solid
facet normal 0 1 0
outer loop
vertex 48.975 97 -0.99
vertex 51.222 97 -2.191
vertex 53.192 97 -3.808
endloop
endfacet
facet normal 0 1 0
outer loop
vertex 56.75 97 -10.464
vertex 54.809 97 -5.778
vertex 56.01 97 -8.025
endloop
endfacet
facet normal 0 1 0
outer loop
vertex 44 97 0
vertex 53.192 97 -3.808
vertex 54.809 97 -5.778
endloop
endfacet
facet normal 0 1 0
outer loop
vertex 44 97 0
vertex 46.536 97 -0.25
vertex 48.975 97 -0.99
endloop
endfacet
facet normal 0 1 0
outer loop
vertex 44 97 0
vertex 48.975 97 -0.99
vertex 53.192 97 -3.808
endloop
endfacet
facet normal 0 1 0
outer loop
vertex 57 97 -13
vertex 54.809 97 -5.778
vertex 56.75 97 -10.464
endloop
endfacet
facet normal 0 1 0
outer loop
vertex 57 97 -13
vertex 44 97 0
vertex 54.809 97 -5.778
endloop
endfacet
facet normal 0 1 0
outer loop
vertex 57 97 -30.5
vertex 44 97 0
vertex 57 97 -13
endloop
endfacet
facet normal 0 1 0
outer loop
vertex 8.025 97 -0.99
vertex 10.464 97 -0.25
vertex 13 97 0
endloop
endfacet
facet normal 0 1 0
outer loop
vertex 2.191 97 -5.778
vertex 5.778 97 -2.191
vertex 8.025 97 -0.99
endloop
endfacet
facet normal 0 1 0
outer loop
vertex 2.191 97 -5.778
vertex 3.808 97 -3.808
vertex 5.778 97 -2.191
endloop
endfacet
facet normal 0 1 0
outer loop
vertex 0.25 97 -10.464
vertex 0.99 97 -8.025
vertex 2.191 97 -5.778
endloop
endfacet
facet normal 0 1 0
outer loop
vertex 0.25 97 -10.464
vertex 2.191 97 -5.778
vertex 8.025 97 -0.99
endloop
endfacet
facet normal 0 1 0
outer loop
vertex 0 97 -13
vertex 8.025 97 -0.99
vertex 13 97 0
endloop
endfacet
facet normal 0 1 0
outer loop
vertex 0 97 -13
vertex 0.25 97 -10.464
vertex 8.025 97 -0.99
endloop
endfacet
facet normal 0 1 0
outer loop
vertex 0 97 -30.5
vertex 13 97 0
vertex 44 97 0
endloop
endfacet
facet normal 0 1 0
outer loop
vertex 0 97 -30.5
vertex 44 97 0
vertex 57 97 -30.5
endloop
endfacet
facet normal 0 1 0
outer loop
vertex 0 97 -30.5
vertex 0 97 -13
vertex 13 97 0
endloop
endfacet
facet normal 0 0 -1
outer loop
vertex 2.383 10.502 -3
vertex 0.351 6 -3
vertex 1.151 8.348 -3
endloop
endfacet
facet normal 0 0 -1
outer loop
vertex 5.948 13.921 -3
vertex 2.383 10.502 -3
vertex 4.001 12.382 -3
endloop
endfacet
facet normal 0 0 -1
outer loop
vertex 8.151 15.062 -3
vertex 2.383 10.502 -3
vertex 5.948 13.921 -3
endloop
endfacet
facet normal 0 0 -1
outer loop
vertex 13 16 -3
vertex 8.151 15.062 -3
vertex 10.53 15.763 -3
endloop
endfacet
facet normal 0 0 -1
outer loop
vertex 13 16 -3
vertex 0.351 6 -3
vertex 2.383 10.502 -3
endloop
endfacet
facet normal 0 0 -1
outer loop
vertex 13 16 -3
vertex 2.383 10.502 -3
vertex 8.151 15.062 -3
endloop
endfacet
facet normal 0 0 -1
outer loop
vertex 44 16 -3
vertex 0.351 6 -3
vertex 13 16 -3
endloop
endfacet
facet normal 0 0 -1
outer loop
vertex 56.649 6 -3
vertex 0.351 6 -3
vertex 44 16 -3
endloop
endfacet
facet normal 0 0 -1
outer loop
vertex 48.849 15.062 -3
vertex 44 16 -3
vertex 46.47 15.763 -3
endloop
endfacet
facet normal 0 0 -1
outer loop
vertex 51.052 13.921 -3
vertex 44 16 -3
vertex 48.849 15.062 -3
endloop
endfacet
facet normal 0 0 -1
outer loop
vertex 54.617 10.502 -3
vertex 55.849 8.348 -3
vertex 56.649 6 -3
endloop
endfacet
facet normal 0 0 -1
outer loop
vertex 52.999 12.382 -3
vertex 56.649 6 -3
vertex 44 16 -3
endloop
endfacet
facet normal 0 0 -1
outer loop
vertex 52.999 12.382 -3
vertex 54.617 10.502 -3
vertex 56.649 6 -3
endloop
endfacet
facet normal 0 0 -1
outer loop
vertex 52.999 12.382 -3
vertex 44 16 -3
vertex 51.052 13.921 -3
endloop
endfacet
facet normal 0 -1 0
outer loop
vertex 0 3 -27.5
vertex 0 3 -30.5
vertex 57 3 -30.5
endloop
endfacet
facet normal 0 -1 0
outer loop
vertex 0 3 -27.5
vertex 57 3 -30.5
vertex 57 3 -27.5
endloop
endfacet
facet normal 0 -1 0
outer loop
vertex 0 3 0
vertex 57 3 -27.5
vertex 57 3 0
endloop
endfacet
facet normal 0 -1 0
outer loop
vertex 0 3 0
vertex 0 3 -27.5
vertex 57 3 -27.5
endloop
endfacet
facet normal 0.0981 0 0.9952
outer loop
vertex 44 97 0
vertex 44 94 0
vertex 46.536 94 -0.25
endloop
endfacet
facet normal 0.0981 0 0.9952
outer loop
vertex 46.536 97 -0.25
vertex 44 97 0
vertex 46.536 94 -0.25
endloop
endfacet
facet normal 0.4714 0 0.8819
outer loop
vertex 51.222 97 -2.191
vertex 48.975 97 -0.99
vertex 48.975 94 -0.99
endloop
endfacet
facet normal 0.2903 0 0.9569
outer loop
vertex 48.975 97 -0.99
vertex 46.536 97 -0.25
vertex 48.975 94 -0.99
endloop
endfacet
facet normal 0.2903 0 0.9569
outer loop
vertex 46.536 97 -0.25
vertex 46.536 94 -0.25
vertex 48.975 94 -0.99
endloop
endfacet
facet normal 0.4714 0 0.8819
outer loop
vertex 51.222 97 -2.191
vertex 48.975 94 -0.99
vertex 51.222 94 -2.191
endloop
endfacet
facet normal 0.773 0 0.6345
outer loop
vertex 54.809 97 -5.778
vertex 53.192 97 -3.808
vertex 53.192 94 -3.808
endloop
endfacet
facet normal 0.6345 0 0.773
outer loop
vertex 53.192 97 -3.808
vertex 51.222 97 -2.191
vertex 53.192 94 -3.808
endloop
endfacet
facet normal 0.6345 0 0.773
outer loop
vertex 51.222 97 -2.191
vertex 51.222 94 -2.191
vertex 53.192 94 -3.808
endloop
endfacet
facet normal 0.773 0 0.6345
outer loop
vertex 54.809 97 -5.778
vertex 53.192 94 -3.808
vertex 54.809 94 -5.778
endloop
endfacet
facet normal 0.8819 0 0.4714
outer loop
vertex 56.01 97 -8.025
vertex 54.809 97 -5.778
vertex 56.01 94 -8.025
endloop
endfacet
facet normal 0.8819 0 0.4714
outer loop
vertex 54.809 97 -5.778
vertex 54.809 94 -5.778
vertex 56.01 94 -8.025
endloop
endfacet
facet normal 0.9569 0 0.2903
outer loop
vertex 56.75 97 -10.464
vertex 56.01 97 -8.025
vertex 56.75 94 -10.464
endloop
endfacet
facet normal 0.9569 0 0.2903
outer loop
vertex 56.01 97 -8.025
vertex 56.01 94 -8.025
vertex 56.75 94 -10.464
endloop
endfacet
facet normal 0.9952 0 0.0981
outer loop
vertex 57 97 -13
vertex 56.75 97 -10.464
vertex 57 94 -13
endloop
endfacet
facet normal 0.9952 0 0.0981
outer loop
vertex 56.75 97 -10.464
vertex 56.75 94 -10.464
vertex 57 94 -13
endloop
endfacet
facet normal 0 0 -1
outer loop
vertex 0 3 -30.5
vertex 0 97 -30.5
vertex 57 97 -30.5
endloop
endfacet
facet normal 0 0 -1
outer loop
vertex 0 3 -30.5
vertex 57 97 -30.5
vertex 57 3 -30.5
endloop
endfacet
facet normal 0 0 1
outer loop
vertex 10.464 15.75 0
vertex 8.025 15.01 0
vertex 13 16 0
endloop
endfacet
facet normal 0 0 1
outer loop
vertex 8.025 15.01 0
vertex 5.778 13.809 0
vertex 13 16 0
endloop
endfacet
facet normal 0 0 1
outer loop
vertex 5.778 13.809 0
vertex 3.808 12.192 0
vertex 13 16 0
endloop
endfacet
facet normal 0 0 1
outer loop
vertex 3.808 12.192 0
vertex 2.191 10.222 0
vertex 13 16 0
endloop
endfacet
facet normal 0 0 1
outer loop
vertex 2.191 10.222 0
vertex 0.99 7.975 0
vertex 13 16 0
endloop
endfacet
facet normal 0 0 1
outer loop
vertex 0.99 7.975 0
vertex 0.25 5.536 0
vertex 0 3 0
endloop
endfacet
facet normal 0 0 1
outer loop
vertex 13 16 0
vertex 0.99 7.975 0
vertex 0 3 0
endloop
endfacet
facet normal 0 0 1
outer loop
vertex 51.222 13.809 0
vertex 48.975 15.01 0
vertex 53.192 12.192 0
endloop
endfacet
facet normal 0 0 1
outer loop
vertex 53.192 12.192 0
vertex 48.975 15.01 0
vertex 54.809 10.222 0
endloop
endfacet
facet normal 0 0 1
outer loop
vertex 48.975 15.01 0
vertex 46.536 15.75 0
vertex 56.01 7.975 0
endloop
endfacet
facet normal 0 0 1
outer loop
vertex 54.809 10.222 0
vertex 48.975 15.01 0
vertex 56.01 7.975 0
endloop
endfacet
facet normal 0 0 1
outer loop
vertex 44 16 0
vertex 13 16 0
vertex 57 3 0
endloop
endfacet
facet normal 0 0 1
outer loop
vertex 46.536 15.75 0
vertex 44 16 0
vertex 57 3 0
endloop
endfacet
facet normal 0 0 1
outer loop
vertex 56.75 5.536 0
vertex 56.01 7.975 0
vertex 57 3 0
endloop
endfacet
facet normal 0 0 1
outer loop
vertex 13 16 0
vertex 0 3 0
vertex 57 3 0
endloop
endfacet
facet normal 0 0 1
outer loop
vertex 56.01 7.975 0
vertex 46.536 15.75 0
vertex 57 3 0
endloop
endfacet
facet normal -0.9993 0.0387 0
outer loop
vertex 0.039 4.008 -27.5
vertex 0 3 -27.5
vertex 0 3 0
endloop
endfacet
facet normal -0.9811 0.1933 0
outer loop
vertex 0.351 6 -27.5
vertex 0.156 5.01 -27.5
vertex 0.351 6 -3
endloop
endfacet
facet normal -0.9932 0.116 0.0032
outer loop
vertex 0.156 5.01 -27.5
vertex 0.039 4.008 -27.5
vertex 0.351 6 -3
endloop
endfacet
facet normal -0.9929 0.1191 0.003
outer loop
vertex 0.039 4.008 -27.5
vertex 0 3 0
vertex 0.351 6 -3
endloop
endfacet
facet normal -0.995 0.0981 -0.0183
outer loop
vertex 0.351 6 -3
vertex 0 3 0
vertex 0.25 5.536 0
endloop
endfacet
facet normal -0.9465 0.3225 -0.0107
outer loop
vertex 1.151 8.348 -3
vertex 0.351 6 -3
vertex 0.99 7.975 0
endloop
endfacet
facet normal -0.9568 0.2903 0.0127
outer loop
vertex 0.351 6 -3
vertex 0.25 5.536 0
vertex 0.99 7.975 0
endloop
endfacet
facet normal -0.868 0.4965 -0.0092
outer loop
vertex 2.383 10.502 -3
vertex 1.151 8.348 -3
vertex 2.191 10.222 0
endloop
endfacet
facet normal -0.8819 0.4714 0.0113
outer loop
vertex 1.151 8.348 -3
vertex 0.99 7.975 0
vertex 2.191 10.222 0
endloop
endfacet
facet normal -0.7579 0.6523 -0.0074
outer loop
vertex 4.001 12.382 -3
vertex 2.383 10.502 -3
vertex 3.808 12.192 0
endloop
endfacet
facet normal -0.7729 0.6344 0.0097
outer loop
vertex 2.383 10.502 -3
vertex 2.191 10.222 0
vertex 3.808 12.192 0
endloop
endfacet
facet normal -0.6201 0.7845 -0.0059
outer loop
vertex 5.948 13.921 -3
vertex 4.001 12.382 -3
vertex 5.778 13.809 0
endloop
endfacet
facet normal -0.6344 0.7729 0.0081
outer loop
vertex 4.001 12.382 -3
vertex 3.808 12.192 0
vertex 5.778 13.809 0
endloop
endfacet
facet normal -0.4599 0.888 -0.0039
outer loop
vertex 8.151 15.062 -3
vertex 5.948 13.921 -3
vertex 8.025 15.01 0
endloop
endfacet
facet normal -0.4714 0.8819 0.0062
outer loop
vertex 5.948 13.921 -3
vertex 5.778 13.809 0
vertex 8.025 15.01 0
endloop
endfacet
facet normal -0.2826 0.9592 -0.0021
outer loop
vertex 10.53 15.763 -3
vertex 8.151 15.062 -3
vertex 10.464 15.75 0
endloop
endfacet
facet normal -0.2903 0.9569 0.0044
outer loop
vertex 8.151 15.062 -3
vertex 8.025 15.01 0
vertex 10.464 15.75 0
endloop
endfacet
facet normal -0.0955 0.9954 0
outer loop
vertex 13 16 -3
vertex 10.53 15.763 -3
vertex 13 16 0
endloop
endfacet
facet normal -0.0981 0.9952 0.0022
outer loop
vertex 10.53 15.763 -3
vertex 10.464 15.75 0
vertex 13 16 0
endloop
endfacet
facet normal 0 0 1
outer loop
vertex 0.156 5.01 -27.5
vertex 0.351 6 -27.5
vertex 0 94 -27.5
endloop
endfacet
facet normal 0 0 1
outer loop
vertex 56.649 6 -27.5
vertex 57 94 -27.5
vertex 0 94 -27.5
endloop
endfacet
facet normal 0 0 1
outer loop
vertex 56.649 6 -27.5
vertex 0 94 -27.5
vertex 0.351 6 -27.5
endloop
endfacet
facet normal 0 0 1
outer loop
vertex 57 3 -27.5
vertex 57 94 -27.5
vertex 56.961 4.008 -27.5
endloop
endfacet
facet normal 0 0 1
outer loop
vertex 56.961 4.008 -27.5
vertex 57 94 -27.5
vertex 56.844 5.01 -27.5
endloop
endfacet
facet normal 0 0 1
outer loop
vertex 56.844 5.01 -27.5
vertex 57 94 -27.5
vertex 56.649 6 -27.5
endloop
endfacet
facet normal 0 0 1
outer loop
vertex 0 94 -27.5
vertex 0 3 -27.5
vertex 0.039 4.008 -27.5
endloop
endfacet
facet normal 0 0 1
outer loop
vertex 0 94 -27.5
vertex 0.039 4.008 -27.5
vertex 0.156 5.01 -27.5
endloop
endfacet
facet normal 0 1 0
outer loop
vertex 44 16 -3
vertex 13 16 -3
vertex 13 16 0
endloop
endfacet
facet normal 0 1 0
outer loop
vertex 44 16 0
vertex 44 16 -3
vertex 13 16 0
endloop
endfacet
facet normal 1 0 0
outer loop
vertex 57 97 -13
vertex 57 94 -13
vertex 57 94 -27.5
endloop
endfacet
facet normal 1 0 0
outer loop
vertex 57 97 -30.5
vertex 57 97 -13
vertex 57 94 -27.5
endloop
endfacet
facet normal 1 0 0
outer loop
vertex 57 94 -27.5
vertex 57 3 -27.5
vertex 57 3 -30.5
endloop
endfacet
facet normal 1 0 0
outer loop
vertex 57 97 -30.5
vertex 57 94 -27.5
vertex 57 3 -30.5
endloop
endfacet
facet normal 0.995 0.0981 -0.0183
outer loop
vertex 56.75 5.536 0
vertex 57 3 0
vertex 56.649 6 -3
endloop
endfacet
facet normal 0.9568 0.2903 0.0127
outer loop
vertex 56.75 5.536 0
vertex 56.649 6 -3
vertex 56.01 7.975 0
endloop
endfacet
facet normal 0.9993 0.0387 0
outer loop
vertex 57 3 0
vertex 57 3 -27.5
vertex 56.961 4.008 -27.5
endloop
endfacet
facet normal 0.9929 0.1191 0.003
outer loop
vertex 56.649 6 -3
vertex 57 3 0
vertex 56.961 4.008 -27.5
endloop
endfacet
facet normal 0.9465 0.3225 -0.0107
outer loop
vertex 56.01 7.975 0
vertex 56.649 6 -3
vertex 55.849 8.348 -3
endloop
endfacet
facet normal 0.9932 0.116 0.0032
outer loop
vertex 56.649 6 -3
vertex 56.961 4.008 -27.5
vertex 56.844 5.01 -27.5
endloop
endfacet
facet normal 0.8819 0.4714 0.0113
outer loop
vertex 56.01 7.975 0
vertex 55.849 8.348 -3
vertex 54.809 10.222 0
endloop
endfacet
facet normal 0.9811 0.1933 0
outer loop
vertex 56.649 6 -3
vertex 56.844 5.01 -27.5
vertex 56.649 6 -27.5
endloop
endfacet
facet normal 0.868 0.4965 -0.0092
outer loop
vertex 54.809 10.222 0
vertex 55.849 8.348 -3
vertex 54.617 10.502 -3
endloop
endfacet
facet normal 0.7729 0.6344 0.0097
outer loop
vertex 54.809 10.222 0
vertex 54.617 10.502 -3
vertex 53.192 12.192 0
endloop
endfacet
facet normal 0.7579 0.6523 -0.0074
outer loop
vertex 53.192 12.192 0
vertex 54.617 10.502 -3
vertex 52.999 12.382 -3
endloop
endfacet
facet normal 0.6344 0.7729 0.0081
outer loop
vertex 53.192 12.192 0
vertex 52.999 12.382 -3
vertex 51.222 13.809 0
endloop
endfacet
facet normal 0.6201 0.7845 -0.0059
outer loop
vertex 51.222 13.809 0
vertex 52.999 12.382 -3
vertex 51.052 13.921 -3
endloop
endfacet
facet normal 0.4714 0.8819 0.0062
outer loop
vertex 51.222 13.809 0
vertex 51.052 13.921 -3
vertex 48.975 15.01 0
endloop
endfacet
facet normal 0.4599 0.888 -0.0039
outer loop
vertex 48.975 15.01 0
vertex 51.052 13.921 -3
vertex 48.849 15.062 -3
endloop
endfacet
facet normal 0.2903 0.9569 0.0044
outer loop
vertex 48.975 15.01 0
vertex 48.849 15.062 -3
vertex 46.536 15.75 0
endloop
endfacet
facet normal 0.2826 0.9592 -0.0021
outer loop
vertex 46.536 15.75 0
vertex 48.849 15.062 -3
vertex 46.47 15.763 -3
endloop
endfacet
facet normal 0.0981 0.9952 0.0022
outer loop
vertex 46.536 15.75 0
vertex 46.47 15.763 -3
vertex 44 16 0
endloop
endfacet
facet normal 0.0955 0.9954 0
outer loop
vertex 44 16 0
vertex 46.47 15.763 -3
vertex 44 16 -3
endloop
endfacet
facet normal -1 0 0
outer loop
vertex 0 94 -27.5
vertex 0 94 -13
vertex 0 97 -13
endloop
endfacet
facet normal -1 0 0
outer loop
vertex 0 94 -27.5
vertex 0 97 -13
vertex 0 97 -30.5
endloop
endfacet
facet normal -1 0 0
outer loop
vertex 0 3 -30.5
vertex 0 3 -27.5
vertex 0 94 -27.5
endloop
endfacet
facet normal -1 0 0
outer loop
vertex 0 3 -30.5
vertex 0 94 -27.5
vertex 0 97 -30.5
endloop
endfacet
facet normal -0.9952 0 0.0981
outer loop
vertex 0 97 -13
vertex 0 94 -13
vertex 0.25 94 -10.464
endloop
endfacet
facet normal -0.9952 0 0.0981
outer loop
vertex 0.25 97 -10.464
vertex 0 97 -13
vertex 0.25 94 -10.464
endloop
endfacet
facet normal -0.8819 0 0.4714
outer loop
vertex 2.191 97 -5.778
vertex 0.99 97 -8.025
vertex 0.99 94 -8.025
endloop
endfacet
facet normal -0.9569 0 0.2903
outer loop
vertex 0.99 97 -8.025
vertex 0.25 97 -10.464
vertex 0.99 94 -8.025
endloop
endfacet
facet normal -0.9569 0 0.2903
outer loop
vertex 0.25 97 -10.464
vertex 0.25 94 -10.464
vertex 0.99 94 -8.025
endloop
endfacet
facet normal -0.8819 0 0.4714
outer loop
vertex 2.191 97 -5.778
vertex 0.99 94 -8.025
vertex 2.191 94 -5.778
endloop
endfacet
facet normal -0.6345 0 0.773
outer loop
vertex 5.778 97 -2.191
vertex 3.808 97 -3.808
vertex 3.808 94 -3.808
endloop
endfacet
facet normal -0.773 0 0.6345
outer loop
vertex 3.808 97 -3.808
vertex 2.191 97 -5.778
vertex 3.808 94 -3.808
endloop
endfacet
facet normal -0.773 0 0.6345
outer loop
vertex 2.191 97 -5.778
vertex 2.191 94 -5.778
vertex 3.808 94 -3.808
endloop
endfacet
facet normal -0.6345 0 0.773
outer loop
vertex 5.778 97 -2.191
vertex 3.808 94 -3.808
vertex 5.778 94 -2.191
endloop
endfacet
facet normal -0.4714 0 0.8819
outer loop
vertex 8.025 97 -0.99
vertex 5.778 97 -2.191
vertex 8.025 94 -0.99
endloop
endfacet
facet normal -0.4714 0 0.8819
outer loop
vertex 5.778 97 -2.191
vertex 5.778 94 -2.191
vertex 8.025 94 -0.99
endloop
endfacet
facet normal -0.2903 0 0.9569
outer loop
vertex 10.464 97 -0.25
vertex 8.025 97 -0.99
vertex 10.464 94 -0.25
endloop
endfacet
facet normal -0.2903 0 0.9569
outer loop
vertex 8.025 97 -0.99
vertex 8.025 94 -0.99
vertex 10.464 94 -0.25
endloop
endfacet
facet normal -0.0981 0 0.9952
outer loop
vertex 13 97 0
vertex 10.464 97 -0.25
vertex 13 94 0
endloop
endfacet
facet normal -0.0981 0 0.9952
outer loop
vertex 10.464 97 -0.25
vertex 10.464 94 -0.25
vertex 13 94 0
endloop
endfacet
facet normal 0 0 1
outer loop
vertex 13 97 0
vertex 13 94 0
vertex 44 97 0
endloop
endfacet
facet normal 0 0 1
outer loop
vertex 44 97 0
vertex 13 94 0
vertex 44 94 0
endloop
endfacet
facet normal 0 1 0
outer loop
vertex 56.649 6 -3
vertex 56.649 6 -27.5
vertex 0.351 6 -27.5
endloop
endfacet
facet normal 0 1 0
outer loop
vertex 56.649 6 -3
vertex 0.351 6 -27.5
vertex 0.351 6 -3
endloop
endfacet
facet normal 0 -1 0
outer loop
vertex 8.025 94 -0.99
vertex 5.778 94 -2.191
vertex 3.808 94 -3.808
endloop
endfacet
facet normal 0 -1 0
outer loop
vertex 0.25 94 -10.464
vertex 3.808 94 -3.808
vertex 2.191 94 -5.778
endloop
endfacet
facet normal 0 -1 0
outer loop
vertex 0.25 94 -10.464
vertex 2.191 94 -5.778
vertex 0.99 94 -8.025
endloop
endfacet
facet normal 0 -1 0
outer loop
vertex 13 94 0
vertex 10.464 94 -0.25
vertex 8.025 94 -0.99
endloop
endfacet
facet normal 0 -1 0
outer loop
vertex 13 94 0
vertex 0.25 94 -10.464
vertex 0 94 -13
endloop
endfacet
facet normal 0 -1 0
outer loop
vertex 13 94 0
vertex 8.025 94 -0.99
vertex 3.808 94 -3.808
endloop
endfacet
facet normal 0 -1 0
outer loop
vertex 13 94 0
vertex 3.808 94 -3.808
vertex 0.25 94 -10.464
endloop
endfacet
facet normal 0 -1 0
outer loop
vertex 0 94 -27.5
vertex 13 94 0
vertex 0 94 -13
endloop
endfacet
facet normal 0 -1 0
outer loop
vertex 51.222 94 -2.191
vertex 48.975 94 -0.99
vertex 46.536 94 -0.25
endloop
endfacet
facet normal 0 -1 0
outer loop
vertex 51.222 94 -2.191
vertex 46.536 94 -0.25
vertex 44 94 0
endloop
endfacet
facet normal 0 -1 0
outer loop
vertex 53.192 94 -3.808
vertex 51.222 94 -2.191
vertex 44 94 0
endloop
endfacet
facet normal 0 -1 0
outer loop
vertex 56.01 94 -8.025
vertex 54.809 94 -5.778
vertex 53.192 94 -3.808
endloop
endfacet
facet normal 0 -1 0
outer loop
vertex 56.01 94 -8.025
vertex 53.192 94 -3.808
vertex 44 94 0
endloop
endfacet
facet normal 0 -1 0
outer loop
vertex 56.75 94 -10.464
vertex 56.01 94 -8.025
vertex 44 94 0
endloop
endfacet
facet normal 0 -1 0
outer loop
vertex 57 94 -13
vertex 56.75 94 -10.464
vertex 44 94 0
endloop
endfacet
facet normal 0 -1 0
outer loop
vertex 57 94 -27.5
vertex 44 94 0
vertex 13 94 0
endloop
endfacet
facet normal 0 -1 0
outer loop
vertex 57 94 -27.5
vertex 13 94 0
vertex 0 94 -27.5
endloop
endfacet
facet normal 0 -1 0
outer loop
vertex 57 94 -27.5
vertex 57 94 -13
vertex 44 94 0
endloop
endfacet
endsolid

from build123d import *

# Parameters (mm, degrees)
SKETCH2_W               = 57
SKETCH2_H               = 33.5
BOSS_EXTRUDE1_DEPTH     = 100
CUT_EXTRUDE3_DEPTH      = 120.880148482
CUT_EXTRUDE3_DEPTH_BACK = 120.880148482
CUT_EXTRUDE5_DEPTH      = 100
FILLET2_R               = 13


with BuildPart() as part:
    # Sketch2 → Boss-Extrude1 (new body)
    with BuildSketch(Plane(origin=(0, 0, 0), x_dir=(1, 0, 0), z_dir=(0, 1, 0))):
        with Locations((28.5, 16.75)):
            Rectangle(SKETCH2_W, SKETCH2_H)
    extrude(amount=BOSS_EXTRUDE1_DEPTH)

    # Sketch3 → Cut-Extrude3 (cut, two sides: drawn at the far end of the back side and taken through both)
    with BuildSketch(Plane(origin=(57, 0, 0), x_dir=(0, 0, -1), z_dir=(1, 0, 0)).offset(-CUT_EXTRUDE3_DEPTH_BACK)):
        Polygon((0, 100), (0, 97), (30.5, 97), (30.5, 3), (0, 3), (0, 0), (33.5, 0), (33.5, 100), align=None)
    extrude(amount=CUT_EXTRUDE3_DEPTH + CUT_EXTRUDE3_DEPTH_BACK, mode=Mode.SUBTRACT)

    # Sketch4 → Cut-Extrude5 (cut)
    with BuildSketch(Plane(origin=(57, 0, 0), x_dir=(0, 0, -1), z_dir=(1, 0, 0))):
        Polygon((0, 94), (27.5, 94), (27.5, 6), (3, 6), (3, 16), (0, 16), align=None)
    extrude(amount=-CUT_EXTRUDE5_DEPTH, mode=Mode.SUBTRACT)

    # Fillet2
    # the kernel refuses this fillet: 13 mm, written as the material it takes off along each edge
    with BuildSketch(Plane(origin=(0, 61.5, 0), x_dir=(0, 0, -1), z_dir=(0, 1, 0)), Plane(origin=(57, 61.5, 0), x_dir=(-1, 0, 0), z_dir=(0, 1, 0))) as fillet2_piece_1:
        with BuildLine():
            CenterArc((FILLET2_R, -FILLET2_R), FILLET2_R, 90, 90)
            Line((0, -FILLET2_R), (0, 0))
            Line((0, 0), (FILLET2_R, 0))
        make_face()
    extrude(amount=68, mode=Mode.SUBTRACT)
    with BuildSketch(Plane(origin=(57, 16, -35.5), x_dir=(-1, 0, 0), z_dir=(0, 0, 1))) as fillet2_piece_2_section:
        with BuildLine():
            CenterArc((FILLET2_R, FILLET2_R), FILLET2_R, 180, 90)
            Line((0, FILLET2_R), (0, 0))
            Line((0, 0), (FILLET2_R, 0))
        make_face()
    fillet2_piece_2 = extrude(amount=68, mode=Mode.PRIVATE)
    fillet2_piece_2 = split(fillet2_piece_2, bisect_by=Plane(origin=(56.894981294, 5.25203924, -27.5), z_dir=(0, 0, 1)), keep=Keep.TOP, mode=Mode.PRIVATE)
    add(fillet2_piece_2, mode=Mode.SUBTRACT)
    with BuildSketch(Plane(origin=(0, 16, 32.5), x_dir=(0, -1, 0), z_dir=(0, 0, -1))) as fillet2_piece_3_section:
        with BuildLine():
            CenterArc((FILLET2_R, -FILLET2_R), FILLET2_R, 90, 90)
            Line((0, -FILLET2_R), (0, 0))
            Line((0, 0), (FILLET2_R, 0))
        make_face()
    fillet2_piece_3 = extrude(amount=68, mode=Mode.PRIVATE)
    fillet2_piece_3 = split(fillet2_piece_3, bisect_by=Plane(origin=(0.105018706, 5.25203924, -27.5), z_dir=(0, 0, 1)), keep=Keep.TOP, mode=Mode.PRIVATE)
    add(fillet2_piece_3, mode=Mode.SUBTRACT)


solid = part.part
